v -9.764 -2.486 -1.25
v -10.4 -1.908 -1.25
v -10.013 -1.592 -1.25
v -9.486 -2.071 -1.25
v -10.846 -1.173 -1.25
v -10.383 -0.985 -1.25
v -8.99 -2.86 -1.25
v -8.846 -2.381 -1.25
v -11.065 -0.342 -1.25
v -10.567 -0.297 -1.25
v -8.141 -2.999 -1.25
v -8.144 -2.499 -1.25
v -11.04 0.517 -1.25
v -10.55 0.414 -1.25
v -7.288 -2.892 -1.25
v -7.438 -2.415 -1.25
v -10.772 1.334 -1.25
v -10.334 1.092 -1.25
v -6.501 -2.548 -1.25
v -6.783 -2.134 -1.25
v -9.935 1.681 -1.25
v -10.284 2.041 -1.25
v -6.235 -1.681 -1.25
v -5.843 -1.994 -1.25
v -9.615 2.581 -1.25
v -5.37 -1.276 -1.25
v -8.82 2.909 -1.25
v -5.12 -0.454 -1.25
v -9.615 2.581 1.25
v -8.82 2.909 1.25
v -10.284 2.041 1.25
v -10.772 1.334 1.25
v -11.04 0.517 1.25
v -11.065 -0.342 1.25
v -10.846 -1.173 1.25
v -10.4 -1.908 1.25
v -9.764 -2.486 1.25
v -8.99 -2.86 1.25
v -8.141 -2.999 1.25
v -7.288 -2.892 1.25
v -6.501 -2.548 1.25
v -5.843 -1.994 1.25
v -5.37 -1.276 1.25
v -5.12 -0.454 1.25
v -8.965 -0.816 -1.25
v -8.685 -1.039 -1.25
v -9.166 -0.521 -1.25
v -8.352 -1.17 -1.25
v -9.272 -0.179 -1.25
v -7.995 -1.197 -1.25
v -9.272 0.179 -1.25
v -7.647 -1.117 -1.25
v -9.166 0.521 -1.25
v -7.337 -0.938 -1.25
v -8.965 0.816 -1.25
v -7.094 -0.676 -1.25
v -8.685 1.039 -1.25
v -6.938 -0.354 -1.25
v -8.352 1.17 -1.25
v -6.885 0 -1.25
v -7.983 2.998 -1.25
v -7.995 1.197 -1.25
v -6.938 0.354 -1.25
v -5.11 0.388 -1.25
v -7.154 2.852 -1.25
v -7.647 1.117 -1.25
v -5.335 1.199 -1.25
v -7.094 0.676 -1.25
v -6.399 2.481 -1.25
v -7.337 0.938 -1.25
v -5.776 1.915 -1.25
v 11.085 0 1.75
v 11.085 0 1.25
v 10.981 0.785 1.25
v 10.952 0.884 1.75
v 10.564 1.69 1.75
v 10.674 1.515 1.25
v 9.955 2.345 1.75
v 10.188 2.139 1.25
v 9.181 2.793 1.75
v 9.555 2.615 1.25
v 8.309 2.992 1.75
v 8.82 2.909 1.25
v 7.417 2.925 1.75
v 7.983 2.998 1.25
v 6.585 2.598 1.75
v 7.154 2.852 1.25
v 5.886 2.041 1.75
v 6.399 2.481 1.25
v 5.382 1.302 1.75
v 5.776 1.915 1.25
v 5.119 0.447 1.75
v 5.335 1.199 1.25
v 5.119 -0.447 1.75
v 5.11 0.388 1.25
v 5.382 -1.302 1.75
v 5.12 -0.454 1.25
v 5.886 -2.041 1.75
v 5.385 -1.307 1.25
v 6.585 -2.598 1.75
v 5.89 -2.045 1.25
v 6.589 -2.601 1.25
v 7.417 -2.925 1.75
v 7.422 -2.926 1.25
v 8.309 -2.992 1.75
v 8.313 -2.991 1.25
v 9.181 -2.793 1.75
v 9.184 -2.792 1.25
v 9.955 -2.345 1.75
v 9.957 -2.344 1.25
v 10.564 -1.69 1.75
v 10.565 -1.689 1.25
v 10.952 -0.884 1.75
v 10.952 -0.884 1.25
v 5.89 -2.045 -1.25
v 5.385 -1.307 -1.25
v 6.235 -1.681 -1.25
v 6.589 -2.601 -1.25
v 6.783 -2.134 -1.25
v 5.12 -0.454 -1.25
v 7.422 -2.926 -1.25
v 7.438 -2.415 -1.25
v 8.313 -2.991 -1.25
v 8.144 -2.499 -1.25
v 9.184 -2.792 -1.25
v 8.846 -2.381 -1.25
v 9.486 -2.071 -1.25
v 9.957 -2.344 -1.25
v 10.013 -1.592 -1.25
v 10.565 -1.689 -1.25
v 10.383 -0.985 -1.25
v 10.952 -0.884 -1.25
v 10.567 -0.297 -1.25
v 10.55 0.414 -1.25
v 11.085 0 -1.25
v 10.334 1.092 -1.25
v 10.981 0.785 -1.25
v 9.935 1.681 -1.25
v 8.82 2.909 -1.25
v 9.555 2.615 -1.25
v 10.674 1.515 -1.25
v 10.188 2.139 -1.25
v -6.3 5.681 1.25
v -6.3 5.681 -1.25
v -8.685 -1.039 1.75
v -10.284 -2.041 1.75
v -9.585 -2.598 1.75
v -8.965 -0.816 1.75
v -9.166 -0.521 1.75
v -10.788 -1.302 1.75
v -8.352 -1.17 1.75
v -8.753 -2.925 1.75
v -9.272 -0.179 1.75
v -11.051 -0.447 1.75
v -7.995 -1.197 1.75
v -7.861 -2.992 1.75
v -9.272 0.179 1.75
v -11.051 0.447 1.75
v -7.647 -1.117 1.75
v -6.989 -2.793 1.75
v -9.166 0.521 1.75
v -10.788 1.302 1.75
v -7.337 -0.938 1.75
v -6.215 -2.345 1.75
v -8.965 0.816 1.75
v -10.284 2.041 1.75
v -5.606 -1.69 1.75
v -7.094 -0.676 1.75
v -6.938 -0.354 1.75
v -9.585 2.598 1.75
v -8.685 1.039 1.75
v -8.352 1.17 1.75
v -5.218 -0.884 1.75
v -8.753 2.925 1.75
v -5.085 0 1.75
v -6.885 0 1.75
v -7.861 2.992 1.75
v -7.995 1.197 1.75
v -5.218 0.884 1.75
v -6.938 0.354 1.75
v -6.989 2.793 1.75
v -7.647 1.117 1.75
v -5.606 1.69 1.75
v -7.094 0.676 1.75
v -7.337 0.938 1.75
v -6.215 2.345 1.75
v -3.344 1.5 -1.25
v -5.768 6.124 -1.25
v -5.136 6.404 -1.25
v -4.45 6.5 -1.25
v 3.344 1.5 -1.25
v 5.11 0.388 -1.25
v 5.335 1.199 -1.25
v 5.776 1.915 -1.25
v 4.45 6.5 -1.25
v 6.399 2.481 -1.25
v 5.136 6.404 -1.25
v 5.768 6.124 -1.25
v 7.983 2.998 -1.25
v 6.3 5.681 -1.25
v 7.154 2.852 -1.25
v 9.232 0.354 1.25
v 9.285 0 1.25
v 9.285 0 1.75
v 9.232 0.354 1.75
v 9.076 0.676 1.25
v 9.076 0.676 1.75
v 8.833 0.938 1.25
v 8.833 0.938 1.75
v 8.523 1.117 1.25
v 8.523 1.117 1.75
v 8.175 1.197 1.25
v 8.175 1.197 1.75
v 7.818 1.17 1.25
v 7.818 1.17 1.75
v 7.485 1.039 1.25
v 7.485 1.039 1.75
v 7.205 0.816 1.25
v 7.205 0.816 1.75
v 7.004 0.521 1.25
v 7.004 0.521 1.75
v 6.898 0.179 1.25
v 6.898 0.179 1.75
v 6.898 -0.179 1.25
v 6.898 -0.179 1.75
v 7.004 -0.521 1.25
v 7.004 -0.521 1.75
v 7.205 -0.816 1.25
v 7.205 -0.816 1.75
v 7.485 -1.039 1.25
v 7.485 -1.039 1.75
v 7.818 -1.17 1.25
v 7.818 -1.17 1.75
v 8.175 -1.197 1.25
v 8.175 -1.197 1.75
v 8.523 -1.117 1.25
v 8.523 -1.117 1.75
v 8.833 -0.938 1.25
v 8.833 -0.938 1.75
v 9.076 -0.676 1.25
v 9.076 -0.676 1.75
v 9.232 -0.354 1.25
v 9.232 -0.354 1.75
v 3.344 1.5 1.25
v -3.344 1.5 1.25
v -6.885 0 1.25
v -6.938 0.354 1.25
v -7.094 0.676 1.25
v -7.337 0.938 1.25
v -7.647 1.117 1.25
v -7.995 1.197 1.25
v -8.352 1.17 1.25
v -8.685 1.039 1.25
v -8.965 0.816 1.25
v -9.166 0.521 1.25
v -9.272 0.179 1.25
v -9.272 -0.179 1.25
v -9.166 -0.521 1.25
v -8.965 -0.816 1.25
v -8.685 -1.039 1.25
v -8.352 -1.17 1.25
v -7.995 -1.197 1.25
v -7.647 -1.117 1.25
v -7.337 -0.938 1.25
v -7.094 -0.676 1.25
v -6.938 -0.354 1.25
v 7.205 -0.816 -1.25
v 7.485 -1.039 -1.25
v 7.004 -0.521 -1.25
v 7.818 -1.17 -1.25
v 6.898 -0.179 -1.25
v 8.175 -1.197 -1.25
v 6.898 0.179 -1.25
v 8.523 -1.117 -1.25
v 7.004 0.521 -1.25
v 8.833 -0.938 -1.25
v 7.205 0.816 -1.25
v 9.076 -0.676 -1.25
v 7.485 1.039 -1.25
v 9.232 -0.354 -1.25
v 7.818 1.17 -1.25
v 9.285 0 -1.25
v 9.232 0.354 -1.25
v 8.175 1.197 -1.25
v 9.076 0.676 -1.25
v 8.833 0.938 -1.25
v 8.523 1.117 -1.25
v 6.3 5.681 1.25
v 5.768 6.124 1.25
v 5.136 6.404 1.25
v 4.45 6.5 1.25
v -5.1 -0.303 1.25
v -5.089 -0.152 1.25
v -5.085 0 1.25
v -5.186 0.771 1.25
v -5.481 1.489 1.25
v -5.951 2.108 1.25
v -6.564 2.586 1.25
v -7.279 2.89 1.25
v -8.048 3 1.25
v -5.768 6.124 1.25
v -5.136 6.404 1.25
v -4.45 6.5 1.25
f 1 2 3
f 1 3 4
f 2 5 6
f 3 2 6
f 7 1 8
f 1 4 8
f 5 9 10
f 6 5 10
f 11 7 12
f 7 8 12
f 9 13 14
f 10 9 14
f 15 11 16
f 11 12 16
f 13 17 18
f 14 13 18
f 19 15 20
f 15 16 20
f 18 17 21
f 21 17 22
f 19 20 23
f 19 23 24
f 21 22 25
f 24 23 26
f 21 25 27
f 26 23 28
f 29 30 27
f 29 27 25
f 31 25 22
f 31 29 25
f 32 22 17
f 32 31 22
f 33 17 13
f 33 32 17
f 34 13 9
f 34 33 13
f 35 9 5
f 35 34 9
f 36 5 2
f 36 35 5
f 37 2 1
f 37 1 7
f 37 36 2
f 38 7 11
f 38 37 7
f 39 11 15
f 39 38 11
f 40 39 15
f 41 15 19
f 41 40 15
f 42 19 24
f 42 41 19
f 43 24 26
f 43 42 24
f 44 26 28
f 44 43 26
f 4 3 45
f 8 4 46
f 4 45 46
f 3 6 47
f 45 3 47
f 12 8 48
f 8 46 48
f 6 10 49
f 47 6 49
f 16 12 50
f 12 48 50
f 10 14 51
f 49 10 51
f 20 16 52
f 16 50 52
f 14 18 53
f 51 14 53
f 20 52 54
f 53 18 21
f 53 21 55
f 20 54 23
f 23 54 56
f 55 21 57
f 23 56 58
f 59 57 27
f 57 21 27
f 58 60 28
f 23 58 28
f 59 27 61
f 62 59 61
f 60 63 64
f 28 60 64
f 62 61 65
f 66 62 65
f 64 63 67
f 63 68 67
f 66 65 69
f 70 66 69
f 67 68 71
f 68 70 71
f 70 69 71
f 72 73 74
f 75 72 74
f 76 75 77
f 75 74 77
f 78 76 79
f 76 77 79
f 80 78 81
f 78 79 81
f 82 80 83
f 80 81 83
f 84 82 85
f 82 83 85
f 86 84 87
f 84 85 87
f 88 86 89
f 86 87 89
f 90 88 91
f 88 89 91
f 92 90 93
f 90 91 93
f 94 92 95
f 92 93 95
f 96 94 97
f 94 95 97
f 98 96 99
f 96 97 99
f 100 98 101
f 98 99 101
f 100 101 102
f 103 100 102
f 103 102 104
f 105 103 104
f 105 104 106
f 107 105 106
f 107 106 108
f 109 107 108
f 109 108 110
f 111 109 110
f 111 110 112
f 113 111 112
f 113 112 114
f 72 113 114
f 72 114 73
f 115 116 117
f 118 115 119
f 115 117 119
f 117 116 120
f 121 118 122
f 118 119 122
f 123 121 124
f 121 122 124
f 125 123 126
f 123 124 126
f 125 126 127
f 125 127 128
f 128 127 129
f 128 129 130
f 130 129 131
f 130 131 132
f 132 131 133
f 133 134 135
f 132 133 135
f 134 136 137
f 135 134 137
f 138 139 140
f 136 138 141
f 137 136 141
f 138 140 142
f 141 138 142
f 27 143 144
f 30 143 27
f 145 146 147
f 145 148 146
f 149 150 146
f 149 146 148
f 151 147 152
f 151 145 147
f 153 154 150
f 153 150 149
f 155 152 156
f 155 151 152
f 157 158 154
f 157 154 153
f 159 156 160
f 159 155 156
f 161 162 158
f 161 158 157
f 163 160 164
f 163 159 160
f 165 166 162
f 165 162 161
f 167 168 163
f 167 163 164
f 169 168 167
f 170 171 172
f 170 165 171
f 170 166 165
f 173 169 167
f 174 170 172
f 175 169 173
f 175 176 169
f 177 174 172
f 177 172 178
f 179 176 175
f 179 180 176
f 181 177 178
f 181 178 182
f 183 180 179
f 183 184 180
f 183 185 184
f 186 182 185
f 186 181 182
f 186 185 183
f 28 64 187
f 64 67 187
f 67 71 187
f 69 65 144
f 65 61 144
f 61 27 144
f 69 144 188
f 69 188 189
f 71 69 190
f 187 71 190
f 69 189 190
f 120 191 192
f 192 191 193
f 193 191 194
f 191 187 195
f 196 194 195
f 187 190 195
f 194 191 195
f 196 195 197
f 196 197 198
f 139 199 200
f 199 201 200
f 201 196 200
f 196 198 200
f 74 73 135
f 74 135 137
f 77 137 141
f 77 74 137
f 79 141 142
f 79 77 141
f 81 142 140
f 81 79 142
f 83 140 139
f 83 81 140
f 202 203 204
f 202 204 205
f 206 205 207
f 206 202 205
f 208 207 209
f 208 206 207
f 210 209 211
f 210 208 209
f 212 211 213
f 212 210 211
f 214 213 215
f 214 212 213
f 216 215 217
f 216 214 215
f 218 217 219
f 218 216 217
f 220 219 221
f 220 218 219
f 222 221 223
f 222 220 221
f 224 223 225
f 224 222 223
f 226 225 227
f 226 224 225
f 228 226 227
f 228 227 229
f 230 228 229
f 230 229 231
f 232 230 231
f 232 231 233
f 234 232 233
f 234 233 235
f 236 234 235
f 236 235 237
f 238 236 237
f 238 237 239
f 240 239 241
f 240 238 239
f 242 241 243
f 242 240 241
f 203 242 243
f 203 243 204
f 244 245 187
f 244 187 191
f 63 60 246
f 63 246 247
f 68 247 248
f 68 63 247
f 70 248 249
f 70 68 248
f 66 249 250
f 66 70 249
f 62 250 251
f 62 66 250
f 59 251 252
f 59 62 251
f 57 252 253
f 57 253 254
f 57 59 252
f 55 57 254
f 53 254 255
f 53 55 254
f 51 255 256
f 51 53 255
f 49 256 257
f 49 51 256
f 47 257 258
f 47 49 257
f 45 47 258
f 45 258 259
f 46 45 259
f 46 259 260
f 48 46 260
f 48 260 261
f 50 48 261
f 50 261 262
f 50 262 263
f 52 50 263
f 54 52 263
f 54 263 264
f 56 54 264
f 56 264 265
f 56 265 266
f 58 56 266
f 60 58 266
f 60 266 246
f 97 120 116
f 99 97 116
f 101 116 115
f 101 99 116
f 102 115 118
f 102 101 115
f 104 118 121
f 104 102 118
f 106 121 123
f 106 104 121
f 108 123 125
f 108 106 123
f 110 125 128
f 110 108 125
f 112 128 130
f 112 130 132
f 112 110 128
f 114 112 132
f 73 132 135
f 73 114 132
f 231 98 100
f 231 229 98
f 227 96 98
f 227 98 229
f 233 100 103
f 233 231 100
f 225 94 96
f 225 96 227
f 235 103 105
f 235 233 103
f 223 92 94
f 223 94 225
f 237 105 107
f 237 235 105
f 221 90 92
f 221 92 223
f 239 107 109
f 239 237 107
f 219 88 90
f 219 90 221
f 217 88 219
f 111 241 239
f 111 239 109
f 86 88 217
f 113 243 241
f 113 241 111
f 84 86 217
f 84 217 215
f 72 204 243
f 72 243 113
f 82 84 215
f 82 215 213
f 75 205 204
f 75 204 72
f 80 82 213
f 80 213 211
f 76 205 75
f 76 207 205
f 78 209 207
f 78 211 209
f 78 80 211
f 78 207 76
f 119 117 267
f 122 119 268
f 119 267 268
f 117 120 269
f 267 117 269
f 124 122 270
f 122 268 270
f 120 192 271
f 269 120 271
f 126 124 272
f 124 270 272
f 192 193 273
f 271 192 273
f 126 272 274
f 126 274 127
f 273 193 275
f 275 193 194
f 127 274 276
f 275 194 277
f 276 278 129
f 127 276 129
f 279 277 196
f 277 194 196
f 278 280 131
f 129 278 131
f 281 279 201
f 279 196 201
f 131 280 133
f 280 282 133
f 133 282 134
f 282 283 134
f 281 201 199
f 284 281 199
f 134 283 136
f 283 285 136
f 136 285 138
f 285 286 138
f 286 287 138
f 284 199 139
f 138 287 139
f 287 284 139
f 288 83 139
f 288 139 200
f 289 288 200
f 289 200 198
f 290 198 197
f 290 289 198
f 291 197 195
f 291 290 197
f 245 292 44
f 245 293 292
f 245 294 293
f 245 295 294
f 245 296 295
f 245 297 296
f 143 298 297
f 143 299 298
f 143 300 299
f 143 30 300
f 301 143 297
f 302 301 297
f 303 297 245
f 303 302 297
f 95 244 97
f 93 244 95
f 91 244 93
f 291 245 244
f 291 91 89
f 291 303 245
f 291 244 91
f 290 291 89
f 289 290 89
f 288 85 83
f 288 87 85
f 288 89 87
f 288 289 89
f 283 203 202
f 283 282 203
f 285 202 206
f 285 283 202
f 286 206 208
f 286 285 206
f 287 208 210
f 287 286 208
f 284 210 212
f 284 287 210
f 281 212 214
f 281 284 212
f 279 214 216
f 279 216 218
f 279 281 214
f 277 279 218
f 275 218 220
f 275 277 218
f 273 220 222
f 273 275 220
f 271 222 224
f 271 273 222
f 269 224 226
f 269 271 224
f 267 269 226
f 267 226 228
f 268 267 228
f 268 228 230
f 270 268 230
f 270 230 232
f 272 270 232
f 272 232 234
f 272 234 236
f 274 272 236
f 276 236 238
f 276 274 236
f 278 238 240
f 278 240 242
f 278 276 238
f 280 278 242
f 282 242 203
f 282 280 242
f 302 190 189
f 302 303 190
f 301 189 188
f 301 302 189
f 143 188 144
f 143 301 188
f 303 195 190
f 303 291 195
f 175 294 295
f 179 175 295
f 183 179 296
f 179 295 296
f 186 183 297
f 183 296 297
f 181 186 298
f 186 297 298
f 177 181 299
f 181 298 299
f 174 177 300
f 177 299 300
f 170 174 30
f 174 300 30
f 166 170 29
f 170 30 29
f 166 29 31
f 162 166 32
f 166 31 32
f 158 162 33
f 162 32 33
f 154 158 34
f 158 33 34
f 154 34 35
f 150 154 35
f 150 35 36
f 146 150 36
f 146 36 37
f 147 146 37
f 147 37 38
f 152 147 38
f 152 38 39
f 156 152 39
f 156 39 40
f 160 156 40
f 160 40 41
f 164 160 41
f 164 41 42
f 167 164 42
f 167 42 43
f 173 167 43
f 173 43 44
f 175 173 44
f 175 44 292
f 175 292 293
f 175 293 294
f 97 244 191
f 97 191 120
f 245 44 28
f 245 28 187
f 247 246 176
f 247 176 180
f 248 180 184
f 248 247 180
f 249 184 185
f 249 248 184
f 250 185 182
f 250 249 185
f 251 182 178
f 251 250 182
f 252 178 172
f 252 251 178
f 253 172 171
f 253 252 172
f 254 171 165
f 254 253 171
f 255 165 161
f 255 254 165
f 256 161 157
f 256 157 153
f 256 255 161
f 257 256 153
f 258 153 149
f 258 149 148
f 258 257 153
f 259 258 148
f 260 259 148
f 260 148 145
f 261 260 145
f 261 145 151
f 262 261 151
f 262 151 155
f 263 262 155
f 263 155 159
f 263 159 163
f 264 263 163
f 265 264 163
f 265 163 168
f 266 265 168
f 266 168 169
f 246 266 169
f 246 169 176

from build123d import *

# Parameters (mm, degrees)
SKETCH1_R                = 1.2
BOSS_EXTRUDE1_DEPTH      = 1.25
SKETCH2_R                = 3
SKETCH2_R_2              = 1.2
BOSS_EXTRUDE2_DEPTH      = 0.5
BOSS_EXTRUDE2_DEPTH_BACK = 2.5


with BuildPart() as part:
    # Sketch1 → Boss-Extrude1 (new body, symmetric)
    with BuildSketch(Plane.XY):
        with BuildLine():
            Line((-6.234807428, -1.68130528), (-3.34389464, 1.5))
            Line((-3.34389464, 1.5), (3.34389464, 1.5))
            Line((3.34389464, 1.5), (6.234807428, -1.68130528))
            ThreePointArc((6.234807428, -1.68130528), (9.76630528, -1.850192572), (9.935192572, 1.68130528))
            Line((9.935192572, 1.68130528), (6.300316278, 5.68130528))
            ThreePointArc((6.300316278, 5.68130528), (5.461740431, 6.286182757), (4.450123705, 6.5))
            Line((4.450123705, 6.5), (-4.450123705, 6.5))
            ThreePointArc((-4.450123705, 6.5), (-5.461740431, 6.286182757), (-6.300316278, 5.68130528))
            Line((-6.300316278, 5.68130528), (-9.935192572, 1.68130528))
            ThreePointArc((-9.935192572, 1.68130528), (-9.76630528, -1.850192572), (-6.234807428, -1.68130528))
        make_face()
        with Locations((-8.085, 0)):
            Circle(SKETCH1_R, mode=Mode.SUBTRACT)
        with Locations((8.085, 0)):
            Circle(SKETCH1_R, mode=Mode.SUBTRACT)
    extrude(amount=BOSS_EXTRUDE1_DEPTH, both=True)

    # Sketch2 → Boss-Extrude2 (add, two sides)
    with BuildSketch(Plane.XY.offset(1.25)) as boss_extrude2_sk:
        with Locations((8.085, 0)):
            Circle(SKETCH2_R)
        with Locations((8.085, 0)):
            Circle(SKETCH2_R_2, mode=Mode.SUBTRACT)
        with Locations((-8.085, 0)):
            Circle(SKETCH2_R)
        with Locations((-8.085, 0)):
            Circle(SKETCH2_R_2, mode=Mode.SUBTRACT)
    extrude(amount=BOSS_EXTRUDE2_DEPTH)
    extrude(boss_extrude2_sk.sketch, amount=-BOSS_EXTRUDE2_DEPTH_BACK)


solid = part.part
